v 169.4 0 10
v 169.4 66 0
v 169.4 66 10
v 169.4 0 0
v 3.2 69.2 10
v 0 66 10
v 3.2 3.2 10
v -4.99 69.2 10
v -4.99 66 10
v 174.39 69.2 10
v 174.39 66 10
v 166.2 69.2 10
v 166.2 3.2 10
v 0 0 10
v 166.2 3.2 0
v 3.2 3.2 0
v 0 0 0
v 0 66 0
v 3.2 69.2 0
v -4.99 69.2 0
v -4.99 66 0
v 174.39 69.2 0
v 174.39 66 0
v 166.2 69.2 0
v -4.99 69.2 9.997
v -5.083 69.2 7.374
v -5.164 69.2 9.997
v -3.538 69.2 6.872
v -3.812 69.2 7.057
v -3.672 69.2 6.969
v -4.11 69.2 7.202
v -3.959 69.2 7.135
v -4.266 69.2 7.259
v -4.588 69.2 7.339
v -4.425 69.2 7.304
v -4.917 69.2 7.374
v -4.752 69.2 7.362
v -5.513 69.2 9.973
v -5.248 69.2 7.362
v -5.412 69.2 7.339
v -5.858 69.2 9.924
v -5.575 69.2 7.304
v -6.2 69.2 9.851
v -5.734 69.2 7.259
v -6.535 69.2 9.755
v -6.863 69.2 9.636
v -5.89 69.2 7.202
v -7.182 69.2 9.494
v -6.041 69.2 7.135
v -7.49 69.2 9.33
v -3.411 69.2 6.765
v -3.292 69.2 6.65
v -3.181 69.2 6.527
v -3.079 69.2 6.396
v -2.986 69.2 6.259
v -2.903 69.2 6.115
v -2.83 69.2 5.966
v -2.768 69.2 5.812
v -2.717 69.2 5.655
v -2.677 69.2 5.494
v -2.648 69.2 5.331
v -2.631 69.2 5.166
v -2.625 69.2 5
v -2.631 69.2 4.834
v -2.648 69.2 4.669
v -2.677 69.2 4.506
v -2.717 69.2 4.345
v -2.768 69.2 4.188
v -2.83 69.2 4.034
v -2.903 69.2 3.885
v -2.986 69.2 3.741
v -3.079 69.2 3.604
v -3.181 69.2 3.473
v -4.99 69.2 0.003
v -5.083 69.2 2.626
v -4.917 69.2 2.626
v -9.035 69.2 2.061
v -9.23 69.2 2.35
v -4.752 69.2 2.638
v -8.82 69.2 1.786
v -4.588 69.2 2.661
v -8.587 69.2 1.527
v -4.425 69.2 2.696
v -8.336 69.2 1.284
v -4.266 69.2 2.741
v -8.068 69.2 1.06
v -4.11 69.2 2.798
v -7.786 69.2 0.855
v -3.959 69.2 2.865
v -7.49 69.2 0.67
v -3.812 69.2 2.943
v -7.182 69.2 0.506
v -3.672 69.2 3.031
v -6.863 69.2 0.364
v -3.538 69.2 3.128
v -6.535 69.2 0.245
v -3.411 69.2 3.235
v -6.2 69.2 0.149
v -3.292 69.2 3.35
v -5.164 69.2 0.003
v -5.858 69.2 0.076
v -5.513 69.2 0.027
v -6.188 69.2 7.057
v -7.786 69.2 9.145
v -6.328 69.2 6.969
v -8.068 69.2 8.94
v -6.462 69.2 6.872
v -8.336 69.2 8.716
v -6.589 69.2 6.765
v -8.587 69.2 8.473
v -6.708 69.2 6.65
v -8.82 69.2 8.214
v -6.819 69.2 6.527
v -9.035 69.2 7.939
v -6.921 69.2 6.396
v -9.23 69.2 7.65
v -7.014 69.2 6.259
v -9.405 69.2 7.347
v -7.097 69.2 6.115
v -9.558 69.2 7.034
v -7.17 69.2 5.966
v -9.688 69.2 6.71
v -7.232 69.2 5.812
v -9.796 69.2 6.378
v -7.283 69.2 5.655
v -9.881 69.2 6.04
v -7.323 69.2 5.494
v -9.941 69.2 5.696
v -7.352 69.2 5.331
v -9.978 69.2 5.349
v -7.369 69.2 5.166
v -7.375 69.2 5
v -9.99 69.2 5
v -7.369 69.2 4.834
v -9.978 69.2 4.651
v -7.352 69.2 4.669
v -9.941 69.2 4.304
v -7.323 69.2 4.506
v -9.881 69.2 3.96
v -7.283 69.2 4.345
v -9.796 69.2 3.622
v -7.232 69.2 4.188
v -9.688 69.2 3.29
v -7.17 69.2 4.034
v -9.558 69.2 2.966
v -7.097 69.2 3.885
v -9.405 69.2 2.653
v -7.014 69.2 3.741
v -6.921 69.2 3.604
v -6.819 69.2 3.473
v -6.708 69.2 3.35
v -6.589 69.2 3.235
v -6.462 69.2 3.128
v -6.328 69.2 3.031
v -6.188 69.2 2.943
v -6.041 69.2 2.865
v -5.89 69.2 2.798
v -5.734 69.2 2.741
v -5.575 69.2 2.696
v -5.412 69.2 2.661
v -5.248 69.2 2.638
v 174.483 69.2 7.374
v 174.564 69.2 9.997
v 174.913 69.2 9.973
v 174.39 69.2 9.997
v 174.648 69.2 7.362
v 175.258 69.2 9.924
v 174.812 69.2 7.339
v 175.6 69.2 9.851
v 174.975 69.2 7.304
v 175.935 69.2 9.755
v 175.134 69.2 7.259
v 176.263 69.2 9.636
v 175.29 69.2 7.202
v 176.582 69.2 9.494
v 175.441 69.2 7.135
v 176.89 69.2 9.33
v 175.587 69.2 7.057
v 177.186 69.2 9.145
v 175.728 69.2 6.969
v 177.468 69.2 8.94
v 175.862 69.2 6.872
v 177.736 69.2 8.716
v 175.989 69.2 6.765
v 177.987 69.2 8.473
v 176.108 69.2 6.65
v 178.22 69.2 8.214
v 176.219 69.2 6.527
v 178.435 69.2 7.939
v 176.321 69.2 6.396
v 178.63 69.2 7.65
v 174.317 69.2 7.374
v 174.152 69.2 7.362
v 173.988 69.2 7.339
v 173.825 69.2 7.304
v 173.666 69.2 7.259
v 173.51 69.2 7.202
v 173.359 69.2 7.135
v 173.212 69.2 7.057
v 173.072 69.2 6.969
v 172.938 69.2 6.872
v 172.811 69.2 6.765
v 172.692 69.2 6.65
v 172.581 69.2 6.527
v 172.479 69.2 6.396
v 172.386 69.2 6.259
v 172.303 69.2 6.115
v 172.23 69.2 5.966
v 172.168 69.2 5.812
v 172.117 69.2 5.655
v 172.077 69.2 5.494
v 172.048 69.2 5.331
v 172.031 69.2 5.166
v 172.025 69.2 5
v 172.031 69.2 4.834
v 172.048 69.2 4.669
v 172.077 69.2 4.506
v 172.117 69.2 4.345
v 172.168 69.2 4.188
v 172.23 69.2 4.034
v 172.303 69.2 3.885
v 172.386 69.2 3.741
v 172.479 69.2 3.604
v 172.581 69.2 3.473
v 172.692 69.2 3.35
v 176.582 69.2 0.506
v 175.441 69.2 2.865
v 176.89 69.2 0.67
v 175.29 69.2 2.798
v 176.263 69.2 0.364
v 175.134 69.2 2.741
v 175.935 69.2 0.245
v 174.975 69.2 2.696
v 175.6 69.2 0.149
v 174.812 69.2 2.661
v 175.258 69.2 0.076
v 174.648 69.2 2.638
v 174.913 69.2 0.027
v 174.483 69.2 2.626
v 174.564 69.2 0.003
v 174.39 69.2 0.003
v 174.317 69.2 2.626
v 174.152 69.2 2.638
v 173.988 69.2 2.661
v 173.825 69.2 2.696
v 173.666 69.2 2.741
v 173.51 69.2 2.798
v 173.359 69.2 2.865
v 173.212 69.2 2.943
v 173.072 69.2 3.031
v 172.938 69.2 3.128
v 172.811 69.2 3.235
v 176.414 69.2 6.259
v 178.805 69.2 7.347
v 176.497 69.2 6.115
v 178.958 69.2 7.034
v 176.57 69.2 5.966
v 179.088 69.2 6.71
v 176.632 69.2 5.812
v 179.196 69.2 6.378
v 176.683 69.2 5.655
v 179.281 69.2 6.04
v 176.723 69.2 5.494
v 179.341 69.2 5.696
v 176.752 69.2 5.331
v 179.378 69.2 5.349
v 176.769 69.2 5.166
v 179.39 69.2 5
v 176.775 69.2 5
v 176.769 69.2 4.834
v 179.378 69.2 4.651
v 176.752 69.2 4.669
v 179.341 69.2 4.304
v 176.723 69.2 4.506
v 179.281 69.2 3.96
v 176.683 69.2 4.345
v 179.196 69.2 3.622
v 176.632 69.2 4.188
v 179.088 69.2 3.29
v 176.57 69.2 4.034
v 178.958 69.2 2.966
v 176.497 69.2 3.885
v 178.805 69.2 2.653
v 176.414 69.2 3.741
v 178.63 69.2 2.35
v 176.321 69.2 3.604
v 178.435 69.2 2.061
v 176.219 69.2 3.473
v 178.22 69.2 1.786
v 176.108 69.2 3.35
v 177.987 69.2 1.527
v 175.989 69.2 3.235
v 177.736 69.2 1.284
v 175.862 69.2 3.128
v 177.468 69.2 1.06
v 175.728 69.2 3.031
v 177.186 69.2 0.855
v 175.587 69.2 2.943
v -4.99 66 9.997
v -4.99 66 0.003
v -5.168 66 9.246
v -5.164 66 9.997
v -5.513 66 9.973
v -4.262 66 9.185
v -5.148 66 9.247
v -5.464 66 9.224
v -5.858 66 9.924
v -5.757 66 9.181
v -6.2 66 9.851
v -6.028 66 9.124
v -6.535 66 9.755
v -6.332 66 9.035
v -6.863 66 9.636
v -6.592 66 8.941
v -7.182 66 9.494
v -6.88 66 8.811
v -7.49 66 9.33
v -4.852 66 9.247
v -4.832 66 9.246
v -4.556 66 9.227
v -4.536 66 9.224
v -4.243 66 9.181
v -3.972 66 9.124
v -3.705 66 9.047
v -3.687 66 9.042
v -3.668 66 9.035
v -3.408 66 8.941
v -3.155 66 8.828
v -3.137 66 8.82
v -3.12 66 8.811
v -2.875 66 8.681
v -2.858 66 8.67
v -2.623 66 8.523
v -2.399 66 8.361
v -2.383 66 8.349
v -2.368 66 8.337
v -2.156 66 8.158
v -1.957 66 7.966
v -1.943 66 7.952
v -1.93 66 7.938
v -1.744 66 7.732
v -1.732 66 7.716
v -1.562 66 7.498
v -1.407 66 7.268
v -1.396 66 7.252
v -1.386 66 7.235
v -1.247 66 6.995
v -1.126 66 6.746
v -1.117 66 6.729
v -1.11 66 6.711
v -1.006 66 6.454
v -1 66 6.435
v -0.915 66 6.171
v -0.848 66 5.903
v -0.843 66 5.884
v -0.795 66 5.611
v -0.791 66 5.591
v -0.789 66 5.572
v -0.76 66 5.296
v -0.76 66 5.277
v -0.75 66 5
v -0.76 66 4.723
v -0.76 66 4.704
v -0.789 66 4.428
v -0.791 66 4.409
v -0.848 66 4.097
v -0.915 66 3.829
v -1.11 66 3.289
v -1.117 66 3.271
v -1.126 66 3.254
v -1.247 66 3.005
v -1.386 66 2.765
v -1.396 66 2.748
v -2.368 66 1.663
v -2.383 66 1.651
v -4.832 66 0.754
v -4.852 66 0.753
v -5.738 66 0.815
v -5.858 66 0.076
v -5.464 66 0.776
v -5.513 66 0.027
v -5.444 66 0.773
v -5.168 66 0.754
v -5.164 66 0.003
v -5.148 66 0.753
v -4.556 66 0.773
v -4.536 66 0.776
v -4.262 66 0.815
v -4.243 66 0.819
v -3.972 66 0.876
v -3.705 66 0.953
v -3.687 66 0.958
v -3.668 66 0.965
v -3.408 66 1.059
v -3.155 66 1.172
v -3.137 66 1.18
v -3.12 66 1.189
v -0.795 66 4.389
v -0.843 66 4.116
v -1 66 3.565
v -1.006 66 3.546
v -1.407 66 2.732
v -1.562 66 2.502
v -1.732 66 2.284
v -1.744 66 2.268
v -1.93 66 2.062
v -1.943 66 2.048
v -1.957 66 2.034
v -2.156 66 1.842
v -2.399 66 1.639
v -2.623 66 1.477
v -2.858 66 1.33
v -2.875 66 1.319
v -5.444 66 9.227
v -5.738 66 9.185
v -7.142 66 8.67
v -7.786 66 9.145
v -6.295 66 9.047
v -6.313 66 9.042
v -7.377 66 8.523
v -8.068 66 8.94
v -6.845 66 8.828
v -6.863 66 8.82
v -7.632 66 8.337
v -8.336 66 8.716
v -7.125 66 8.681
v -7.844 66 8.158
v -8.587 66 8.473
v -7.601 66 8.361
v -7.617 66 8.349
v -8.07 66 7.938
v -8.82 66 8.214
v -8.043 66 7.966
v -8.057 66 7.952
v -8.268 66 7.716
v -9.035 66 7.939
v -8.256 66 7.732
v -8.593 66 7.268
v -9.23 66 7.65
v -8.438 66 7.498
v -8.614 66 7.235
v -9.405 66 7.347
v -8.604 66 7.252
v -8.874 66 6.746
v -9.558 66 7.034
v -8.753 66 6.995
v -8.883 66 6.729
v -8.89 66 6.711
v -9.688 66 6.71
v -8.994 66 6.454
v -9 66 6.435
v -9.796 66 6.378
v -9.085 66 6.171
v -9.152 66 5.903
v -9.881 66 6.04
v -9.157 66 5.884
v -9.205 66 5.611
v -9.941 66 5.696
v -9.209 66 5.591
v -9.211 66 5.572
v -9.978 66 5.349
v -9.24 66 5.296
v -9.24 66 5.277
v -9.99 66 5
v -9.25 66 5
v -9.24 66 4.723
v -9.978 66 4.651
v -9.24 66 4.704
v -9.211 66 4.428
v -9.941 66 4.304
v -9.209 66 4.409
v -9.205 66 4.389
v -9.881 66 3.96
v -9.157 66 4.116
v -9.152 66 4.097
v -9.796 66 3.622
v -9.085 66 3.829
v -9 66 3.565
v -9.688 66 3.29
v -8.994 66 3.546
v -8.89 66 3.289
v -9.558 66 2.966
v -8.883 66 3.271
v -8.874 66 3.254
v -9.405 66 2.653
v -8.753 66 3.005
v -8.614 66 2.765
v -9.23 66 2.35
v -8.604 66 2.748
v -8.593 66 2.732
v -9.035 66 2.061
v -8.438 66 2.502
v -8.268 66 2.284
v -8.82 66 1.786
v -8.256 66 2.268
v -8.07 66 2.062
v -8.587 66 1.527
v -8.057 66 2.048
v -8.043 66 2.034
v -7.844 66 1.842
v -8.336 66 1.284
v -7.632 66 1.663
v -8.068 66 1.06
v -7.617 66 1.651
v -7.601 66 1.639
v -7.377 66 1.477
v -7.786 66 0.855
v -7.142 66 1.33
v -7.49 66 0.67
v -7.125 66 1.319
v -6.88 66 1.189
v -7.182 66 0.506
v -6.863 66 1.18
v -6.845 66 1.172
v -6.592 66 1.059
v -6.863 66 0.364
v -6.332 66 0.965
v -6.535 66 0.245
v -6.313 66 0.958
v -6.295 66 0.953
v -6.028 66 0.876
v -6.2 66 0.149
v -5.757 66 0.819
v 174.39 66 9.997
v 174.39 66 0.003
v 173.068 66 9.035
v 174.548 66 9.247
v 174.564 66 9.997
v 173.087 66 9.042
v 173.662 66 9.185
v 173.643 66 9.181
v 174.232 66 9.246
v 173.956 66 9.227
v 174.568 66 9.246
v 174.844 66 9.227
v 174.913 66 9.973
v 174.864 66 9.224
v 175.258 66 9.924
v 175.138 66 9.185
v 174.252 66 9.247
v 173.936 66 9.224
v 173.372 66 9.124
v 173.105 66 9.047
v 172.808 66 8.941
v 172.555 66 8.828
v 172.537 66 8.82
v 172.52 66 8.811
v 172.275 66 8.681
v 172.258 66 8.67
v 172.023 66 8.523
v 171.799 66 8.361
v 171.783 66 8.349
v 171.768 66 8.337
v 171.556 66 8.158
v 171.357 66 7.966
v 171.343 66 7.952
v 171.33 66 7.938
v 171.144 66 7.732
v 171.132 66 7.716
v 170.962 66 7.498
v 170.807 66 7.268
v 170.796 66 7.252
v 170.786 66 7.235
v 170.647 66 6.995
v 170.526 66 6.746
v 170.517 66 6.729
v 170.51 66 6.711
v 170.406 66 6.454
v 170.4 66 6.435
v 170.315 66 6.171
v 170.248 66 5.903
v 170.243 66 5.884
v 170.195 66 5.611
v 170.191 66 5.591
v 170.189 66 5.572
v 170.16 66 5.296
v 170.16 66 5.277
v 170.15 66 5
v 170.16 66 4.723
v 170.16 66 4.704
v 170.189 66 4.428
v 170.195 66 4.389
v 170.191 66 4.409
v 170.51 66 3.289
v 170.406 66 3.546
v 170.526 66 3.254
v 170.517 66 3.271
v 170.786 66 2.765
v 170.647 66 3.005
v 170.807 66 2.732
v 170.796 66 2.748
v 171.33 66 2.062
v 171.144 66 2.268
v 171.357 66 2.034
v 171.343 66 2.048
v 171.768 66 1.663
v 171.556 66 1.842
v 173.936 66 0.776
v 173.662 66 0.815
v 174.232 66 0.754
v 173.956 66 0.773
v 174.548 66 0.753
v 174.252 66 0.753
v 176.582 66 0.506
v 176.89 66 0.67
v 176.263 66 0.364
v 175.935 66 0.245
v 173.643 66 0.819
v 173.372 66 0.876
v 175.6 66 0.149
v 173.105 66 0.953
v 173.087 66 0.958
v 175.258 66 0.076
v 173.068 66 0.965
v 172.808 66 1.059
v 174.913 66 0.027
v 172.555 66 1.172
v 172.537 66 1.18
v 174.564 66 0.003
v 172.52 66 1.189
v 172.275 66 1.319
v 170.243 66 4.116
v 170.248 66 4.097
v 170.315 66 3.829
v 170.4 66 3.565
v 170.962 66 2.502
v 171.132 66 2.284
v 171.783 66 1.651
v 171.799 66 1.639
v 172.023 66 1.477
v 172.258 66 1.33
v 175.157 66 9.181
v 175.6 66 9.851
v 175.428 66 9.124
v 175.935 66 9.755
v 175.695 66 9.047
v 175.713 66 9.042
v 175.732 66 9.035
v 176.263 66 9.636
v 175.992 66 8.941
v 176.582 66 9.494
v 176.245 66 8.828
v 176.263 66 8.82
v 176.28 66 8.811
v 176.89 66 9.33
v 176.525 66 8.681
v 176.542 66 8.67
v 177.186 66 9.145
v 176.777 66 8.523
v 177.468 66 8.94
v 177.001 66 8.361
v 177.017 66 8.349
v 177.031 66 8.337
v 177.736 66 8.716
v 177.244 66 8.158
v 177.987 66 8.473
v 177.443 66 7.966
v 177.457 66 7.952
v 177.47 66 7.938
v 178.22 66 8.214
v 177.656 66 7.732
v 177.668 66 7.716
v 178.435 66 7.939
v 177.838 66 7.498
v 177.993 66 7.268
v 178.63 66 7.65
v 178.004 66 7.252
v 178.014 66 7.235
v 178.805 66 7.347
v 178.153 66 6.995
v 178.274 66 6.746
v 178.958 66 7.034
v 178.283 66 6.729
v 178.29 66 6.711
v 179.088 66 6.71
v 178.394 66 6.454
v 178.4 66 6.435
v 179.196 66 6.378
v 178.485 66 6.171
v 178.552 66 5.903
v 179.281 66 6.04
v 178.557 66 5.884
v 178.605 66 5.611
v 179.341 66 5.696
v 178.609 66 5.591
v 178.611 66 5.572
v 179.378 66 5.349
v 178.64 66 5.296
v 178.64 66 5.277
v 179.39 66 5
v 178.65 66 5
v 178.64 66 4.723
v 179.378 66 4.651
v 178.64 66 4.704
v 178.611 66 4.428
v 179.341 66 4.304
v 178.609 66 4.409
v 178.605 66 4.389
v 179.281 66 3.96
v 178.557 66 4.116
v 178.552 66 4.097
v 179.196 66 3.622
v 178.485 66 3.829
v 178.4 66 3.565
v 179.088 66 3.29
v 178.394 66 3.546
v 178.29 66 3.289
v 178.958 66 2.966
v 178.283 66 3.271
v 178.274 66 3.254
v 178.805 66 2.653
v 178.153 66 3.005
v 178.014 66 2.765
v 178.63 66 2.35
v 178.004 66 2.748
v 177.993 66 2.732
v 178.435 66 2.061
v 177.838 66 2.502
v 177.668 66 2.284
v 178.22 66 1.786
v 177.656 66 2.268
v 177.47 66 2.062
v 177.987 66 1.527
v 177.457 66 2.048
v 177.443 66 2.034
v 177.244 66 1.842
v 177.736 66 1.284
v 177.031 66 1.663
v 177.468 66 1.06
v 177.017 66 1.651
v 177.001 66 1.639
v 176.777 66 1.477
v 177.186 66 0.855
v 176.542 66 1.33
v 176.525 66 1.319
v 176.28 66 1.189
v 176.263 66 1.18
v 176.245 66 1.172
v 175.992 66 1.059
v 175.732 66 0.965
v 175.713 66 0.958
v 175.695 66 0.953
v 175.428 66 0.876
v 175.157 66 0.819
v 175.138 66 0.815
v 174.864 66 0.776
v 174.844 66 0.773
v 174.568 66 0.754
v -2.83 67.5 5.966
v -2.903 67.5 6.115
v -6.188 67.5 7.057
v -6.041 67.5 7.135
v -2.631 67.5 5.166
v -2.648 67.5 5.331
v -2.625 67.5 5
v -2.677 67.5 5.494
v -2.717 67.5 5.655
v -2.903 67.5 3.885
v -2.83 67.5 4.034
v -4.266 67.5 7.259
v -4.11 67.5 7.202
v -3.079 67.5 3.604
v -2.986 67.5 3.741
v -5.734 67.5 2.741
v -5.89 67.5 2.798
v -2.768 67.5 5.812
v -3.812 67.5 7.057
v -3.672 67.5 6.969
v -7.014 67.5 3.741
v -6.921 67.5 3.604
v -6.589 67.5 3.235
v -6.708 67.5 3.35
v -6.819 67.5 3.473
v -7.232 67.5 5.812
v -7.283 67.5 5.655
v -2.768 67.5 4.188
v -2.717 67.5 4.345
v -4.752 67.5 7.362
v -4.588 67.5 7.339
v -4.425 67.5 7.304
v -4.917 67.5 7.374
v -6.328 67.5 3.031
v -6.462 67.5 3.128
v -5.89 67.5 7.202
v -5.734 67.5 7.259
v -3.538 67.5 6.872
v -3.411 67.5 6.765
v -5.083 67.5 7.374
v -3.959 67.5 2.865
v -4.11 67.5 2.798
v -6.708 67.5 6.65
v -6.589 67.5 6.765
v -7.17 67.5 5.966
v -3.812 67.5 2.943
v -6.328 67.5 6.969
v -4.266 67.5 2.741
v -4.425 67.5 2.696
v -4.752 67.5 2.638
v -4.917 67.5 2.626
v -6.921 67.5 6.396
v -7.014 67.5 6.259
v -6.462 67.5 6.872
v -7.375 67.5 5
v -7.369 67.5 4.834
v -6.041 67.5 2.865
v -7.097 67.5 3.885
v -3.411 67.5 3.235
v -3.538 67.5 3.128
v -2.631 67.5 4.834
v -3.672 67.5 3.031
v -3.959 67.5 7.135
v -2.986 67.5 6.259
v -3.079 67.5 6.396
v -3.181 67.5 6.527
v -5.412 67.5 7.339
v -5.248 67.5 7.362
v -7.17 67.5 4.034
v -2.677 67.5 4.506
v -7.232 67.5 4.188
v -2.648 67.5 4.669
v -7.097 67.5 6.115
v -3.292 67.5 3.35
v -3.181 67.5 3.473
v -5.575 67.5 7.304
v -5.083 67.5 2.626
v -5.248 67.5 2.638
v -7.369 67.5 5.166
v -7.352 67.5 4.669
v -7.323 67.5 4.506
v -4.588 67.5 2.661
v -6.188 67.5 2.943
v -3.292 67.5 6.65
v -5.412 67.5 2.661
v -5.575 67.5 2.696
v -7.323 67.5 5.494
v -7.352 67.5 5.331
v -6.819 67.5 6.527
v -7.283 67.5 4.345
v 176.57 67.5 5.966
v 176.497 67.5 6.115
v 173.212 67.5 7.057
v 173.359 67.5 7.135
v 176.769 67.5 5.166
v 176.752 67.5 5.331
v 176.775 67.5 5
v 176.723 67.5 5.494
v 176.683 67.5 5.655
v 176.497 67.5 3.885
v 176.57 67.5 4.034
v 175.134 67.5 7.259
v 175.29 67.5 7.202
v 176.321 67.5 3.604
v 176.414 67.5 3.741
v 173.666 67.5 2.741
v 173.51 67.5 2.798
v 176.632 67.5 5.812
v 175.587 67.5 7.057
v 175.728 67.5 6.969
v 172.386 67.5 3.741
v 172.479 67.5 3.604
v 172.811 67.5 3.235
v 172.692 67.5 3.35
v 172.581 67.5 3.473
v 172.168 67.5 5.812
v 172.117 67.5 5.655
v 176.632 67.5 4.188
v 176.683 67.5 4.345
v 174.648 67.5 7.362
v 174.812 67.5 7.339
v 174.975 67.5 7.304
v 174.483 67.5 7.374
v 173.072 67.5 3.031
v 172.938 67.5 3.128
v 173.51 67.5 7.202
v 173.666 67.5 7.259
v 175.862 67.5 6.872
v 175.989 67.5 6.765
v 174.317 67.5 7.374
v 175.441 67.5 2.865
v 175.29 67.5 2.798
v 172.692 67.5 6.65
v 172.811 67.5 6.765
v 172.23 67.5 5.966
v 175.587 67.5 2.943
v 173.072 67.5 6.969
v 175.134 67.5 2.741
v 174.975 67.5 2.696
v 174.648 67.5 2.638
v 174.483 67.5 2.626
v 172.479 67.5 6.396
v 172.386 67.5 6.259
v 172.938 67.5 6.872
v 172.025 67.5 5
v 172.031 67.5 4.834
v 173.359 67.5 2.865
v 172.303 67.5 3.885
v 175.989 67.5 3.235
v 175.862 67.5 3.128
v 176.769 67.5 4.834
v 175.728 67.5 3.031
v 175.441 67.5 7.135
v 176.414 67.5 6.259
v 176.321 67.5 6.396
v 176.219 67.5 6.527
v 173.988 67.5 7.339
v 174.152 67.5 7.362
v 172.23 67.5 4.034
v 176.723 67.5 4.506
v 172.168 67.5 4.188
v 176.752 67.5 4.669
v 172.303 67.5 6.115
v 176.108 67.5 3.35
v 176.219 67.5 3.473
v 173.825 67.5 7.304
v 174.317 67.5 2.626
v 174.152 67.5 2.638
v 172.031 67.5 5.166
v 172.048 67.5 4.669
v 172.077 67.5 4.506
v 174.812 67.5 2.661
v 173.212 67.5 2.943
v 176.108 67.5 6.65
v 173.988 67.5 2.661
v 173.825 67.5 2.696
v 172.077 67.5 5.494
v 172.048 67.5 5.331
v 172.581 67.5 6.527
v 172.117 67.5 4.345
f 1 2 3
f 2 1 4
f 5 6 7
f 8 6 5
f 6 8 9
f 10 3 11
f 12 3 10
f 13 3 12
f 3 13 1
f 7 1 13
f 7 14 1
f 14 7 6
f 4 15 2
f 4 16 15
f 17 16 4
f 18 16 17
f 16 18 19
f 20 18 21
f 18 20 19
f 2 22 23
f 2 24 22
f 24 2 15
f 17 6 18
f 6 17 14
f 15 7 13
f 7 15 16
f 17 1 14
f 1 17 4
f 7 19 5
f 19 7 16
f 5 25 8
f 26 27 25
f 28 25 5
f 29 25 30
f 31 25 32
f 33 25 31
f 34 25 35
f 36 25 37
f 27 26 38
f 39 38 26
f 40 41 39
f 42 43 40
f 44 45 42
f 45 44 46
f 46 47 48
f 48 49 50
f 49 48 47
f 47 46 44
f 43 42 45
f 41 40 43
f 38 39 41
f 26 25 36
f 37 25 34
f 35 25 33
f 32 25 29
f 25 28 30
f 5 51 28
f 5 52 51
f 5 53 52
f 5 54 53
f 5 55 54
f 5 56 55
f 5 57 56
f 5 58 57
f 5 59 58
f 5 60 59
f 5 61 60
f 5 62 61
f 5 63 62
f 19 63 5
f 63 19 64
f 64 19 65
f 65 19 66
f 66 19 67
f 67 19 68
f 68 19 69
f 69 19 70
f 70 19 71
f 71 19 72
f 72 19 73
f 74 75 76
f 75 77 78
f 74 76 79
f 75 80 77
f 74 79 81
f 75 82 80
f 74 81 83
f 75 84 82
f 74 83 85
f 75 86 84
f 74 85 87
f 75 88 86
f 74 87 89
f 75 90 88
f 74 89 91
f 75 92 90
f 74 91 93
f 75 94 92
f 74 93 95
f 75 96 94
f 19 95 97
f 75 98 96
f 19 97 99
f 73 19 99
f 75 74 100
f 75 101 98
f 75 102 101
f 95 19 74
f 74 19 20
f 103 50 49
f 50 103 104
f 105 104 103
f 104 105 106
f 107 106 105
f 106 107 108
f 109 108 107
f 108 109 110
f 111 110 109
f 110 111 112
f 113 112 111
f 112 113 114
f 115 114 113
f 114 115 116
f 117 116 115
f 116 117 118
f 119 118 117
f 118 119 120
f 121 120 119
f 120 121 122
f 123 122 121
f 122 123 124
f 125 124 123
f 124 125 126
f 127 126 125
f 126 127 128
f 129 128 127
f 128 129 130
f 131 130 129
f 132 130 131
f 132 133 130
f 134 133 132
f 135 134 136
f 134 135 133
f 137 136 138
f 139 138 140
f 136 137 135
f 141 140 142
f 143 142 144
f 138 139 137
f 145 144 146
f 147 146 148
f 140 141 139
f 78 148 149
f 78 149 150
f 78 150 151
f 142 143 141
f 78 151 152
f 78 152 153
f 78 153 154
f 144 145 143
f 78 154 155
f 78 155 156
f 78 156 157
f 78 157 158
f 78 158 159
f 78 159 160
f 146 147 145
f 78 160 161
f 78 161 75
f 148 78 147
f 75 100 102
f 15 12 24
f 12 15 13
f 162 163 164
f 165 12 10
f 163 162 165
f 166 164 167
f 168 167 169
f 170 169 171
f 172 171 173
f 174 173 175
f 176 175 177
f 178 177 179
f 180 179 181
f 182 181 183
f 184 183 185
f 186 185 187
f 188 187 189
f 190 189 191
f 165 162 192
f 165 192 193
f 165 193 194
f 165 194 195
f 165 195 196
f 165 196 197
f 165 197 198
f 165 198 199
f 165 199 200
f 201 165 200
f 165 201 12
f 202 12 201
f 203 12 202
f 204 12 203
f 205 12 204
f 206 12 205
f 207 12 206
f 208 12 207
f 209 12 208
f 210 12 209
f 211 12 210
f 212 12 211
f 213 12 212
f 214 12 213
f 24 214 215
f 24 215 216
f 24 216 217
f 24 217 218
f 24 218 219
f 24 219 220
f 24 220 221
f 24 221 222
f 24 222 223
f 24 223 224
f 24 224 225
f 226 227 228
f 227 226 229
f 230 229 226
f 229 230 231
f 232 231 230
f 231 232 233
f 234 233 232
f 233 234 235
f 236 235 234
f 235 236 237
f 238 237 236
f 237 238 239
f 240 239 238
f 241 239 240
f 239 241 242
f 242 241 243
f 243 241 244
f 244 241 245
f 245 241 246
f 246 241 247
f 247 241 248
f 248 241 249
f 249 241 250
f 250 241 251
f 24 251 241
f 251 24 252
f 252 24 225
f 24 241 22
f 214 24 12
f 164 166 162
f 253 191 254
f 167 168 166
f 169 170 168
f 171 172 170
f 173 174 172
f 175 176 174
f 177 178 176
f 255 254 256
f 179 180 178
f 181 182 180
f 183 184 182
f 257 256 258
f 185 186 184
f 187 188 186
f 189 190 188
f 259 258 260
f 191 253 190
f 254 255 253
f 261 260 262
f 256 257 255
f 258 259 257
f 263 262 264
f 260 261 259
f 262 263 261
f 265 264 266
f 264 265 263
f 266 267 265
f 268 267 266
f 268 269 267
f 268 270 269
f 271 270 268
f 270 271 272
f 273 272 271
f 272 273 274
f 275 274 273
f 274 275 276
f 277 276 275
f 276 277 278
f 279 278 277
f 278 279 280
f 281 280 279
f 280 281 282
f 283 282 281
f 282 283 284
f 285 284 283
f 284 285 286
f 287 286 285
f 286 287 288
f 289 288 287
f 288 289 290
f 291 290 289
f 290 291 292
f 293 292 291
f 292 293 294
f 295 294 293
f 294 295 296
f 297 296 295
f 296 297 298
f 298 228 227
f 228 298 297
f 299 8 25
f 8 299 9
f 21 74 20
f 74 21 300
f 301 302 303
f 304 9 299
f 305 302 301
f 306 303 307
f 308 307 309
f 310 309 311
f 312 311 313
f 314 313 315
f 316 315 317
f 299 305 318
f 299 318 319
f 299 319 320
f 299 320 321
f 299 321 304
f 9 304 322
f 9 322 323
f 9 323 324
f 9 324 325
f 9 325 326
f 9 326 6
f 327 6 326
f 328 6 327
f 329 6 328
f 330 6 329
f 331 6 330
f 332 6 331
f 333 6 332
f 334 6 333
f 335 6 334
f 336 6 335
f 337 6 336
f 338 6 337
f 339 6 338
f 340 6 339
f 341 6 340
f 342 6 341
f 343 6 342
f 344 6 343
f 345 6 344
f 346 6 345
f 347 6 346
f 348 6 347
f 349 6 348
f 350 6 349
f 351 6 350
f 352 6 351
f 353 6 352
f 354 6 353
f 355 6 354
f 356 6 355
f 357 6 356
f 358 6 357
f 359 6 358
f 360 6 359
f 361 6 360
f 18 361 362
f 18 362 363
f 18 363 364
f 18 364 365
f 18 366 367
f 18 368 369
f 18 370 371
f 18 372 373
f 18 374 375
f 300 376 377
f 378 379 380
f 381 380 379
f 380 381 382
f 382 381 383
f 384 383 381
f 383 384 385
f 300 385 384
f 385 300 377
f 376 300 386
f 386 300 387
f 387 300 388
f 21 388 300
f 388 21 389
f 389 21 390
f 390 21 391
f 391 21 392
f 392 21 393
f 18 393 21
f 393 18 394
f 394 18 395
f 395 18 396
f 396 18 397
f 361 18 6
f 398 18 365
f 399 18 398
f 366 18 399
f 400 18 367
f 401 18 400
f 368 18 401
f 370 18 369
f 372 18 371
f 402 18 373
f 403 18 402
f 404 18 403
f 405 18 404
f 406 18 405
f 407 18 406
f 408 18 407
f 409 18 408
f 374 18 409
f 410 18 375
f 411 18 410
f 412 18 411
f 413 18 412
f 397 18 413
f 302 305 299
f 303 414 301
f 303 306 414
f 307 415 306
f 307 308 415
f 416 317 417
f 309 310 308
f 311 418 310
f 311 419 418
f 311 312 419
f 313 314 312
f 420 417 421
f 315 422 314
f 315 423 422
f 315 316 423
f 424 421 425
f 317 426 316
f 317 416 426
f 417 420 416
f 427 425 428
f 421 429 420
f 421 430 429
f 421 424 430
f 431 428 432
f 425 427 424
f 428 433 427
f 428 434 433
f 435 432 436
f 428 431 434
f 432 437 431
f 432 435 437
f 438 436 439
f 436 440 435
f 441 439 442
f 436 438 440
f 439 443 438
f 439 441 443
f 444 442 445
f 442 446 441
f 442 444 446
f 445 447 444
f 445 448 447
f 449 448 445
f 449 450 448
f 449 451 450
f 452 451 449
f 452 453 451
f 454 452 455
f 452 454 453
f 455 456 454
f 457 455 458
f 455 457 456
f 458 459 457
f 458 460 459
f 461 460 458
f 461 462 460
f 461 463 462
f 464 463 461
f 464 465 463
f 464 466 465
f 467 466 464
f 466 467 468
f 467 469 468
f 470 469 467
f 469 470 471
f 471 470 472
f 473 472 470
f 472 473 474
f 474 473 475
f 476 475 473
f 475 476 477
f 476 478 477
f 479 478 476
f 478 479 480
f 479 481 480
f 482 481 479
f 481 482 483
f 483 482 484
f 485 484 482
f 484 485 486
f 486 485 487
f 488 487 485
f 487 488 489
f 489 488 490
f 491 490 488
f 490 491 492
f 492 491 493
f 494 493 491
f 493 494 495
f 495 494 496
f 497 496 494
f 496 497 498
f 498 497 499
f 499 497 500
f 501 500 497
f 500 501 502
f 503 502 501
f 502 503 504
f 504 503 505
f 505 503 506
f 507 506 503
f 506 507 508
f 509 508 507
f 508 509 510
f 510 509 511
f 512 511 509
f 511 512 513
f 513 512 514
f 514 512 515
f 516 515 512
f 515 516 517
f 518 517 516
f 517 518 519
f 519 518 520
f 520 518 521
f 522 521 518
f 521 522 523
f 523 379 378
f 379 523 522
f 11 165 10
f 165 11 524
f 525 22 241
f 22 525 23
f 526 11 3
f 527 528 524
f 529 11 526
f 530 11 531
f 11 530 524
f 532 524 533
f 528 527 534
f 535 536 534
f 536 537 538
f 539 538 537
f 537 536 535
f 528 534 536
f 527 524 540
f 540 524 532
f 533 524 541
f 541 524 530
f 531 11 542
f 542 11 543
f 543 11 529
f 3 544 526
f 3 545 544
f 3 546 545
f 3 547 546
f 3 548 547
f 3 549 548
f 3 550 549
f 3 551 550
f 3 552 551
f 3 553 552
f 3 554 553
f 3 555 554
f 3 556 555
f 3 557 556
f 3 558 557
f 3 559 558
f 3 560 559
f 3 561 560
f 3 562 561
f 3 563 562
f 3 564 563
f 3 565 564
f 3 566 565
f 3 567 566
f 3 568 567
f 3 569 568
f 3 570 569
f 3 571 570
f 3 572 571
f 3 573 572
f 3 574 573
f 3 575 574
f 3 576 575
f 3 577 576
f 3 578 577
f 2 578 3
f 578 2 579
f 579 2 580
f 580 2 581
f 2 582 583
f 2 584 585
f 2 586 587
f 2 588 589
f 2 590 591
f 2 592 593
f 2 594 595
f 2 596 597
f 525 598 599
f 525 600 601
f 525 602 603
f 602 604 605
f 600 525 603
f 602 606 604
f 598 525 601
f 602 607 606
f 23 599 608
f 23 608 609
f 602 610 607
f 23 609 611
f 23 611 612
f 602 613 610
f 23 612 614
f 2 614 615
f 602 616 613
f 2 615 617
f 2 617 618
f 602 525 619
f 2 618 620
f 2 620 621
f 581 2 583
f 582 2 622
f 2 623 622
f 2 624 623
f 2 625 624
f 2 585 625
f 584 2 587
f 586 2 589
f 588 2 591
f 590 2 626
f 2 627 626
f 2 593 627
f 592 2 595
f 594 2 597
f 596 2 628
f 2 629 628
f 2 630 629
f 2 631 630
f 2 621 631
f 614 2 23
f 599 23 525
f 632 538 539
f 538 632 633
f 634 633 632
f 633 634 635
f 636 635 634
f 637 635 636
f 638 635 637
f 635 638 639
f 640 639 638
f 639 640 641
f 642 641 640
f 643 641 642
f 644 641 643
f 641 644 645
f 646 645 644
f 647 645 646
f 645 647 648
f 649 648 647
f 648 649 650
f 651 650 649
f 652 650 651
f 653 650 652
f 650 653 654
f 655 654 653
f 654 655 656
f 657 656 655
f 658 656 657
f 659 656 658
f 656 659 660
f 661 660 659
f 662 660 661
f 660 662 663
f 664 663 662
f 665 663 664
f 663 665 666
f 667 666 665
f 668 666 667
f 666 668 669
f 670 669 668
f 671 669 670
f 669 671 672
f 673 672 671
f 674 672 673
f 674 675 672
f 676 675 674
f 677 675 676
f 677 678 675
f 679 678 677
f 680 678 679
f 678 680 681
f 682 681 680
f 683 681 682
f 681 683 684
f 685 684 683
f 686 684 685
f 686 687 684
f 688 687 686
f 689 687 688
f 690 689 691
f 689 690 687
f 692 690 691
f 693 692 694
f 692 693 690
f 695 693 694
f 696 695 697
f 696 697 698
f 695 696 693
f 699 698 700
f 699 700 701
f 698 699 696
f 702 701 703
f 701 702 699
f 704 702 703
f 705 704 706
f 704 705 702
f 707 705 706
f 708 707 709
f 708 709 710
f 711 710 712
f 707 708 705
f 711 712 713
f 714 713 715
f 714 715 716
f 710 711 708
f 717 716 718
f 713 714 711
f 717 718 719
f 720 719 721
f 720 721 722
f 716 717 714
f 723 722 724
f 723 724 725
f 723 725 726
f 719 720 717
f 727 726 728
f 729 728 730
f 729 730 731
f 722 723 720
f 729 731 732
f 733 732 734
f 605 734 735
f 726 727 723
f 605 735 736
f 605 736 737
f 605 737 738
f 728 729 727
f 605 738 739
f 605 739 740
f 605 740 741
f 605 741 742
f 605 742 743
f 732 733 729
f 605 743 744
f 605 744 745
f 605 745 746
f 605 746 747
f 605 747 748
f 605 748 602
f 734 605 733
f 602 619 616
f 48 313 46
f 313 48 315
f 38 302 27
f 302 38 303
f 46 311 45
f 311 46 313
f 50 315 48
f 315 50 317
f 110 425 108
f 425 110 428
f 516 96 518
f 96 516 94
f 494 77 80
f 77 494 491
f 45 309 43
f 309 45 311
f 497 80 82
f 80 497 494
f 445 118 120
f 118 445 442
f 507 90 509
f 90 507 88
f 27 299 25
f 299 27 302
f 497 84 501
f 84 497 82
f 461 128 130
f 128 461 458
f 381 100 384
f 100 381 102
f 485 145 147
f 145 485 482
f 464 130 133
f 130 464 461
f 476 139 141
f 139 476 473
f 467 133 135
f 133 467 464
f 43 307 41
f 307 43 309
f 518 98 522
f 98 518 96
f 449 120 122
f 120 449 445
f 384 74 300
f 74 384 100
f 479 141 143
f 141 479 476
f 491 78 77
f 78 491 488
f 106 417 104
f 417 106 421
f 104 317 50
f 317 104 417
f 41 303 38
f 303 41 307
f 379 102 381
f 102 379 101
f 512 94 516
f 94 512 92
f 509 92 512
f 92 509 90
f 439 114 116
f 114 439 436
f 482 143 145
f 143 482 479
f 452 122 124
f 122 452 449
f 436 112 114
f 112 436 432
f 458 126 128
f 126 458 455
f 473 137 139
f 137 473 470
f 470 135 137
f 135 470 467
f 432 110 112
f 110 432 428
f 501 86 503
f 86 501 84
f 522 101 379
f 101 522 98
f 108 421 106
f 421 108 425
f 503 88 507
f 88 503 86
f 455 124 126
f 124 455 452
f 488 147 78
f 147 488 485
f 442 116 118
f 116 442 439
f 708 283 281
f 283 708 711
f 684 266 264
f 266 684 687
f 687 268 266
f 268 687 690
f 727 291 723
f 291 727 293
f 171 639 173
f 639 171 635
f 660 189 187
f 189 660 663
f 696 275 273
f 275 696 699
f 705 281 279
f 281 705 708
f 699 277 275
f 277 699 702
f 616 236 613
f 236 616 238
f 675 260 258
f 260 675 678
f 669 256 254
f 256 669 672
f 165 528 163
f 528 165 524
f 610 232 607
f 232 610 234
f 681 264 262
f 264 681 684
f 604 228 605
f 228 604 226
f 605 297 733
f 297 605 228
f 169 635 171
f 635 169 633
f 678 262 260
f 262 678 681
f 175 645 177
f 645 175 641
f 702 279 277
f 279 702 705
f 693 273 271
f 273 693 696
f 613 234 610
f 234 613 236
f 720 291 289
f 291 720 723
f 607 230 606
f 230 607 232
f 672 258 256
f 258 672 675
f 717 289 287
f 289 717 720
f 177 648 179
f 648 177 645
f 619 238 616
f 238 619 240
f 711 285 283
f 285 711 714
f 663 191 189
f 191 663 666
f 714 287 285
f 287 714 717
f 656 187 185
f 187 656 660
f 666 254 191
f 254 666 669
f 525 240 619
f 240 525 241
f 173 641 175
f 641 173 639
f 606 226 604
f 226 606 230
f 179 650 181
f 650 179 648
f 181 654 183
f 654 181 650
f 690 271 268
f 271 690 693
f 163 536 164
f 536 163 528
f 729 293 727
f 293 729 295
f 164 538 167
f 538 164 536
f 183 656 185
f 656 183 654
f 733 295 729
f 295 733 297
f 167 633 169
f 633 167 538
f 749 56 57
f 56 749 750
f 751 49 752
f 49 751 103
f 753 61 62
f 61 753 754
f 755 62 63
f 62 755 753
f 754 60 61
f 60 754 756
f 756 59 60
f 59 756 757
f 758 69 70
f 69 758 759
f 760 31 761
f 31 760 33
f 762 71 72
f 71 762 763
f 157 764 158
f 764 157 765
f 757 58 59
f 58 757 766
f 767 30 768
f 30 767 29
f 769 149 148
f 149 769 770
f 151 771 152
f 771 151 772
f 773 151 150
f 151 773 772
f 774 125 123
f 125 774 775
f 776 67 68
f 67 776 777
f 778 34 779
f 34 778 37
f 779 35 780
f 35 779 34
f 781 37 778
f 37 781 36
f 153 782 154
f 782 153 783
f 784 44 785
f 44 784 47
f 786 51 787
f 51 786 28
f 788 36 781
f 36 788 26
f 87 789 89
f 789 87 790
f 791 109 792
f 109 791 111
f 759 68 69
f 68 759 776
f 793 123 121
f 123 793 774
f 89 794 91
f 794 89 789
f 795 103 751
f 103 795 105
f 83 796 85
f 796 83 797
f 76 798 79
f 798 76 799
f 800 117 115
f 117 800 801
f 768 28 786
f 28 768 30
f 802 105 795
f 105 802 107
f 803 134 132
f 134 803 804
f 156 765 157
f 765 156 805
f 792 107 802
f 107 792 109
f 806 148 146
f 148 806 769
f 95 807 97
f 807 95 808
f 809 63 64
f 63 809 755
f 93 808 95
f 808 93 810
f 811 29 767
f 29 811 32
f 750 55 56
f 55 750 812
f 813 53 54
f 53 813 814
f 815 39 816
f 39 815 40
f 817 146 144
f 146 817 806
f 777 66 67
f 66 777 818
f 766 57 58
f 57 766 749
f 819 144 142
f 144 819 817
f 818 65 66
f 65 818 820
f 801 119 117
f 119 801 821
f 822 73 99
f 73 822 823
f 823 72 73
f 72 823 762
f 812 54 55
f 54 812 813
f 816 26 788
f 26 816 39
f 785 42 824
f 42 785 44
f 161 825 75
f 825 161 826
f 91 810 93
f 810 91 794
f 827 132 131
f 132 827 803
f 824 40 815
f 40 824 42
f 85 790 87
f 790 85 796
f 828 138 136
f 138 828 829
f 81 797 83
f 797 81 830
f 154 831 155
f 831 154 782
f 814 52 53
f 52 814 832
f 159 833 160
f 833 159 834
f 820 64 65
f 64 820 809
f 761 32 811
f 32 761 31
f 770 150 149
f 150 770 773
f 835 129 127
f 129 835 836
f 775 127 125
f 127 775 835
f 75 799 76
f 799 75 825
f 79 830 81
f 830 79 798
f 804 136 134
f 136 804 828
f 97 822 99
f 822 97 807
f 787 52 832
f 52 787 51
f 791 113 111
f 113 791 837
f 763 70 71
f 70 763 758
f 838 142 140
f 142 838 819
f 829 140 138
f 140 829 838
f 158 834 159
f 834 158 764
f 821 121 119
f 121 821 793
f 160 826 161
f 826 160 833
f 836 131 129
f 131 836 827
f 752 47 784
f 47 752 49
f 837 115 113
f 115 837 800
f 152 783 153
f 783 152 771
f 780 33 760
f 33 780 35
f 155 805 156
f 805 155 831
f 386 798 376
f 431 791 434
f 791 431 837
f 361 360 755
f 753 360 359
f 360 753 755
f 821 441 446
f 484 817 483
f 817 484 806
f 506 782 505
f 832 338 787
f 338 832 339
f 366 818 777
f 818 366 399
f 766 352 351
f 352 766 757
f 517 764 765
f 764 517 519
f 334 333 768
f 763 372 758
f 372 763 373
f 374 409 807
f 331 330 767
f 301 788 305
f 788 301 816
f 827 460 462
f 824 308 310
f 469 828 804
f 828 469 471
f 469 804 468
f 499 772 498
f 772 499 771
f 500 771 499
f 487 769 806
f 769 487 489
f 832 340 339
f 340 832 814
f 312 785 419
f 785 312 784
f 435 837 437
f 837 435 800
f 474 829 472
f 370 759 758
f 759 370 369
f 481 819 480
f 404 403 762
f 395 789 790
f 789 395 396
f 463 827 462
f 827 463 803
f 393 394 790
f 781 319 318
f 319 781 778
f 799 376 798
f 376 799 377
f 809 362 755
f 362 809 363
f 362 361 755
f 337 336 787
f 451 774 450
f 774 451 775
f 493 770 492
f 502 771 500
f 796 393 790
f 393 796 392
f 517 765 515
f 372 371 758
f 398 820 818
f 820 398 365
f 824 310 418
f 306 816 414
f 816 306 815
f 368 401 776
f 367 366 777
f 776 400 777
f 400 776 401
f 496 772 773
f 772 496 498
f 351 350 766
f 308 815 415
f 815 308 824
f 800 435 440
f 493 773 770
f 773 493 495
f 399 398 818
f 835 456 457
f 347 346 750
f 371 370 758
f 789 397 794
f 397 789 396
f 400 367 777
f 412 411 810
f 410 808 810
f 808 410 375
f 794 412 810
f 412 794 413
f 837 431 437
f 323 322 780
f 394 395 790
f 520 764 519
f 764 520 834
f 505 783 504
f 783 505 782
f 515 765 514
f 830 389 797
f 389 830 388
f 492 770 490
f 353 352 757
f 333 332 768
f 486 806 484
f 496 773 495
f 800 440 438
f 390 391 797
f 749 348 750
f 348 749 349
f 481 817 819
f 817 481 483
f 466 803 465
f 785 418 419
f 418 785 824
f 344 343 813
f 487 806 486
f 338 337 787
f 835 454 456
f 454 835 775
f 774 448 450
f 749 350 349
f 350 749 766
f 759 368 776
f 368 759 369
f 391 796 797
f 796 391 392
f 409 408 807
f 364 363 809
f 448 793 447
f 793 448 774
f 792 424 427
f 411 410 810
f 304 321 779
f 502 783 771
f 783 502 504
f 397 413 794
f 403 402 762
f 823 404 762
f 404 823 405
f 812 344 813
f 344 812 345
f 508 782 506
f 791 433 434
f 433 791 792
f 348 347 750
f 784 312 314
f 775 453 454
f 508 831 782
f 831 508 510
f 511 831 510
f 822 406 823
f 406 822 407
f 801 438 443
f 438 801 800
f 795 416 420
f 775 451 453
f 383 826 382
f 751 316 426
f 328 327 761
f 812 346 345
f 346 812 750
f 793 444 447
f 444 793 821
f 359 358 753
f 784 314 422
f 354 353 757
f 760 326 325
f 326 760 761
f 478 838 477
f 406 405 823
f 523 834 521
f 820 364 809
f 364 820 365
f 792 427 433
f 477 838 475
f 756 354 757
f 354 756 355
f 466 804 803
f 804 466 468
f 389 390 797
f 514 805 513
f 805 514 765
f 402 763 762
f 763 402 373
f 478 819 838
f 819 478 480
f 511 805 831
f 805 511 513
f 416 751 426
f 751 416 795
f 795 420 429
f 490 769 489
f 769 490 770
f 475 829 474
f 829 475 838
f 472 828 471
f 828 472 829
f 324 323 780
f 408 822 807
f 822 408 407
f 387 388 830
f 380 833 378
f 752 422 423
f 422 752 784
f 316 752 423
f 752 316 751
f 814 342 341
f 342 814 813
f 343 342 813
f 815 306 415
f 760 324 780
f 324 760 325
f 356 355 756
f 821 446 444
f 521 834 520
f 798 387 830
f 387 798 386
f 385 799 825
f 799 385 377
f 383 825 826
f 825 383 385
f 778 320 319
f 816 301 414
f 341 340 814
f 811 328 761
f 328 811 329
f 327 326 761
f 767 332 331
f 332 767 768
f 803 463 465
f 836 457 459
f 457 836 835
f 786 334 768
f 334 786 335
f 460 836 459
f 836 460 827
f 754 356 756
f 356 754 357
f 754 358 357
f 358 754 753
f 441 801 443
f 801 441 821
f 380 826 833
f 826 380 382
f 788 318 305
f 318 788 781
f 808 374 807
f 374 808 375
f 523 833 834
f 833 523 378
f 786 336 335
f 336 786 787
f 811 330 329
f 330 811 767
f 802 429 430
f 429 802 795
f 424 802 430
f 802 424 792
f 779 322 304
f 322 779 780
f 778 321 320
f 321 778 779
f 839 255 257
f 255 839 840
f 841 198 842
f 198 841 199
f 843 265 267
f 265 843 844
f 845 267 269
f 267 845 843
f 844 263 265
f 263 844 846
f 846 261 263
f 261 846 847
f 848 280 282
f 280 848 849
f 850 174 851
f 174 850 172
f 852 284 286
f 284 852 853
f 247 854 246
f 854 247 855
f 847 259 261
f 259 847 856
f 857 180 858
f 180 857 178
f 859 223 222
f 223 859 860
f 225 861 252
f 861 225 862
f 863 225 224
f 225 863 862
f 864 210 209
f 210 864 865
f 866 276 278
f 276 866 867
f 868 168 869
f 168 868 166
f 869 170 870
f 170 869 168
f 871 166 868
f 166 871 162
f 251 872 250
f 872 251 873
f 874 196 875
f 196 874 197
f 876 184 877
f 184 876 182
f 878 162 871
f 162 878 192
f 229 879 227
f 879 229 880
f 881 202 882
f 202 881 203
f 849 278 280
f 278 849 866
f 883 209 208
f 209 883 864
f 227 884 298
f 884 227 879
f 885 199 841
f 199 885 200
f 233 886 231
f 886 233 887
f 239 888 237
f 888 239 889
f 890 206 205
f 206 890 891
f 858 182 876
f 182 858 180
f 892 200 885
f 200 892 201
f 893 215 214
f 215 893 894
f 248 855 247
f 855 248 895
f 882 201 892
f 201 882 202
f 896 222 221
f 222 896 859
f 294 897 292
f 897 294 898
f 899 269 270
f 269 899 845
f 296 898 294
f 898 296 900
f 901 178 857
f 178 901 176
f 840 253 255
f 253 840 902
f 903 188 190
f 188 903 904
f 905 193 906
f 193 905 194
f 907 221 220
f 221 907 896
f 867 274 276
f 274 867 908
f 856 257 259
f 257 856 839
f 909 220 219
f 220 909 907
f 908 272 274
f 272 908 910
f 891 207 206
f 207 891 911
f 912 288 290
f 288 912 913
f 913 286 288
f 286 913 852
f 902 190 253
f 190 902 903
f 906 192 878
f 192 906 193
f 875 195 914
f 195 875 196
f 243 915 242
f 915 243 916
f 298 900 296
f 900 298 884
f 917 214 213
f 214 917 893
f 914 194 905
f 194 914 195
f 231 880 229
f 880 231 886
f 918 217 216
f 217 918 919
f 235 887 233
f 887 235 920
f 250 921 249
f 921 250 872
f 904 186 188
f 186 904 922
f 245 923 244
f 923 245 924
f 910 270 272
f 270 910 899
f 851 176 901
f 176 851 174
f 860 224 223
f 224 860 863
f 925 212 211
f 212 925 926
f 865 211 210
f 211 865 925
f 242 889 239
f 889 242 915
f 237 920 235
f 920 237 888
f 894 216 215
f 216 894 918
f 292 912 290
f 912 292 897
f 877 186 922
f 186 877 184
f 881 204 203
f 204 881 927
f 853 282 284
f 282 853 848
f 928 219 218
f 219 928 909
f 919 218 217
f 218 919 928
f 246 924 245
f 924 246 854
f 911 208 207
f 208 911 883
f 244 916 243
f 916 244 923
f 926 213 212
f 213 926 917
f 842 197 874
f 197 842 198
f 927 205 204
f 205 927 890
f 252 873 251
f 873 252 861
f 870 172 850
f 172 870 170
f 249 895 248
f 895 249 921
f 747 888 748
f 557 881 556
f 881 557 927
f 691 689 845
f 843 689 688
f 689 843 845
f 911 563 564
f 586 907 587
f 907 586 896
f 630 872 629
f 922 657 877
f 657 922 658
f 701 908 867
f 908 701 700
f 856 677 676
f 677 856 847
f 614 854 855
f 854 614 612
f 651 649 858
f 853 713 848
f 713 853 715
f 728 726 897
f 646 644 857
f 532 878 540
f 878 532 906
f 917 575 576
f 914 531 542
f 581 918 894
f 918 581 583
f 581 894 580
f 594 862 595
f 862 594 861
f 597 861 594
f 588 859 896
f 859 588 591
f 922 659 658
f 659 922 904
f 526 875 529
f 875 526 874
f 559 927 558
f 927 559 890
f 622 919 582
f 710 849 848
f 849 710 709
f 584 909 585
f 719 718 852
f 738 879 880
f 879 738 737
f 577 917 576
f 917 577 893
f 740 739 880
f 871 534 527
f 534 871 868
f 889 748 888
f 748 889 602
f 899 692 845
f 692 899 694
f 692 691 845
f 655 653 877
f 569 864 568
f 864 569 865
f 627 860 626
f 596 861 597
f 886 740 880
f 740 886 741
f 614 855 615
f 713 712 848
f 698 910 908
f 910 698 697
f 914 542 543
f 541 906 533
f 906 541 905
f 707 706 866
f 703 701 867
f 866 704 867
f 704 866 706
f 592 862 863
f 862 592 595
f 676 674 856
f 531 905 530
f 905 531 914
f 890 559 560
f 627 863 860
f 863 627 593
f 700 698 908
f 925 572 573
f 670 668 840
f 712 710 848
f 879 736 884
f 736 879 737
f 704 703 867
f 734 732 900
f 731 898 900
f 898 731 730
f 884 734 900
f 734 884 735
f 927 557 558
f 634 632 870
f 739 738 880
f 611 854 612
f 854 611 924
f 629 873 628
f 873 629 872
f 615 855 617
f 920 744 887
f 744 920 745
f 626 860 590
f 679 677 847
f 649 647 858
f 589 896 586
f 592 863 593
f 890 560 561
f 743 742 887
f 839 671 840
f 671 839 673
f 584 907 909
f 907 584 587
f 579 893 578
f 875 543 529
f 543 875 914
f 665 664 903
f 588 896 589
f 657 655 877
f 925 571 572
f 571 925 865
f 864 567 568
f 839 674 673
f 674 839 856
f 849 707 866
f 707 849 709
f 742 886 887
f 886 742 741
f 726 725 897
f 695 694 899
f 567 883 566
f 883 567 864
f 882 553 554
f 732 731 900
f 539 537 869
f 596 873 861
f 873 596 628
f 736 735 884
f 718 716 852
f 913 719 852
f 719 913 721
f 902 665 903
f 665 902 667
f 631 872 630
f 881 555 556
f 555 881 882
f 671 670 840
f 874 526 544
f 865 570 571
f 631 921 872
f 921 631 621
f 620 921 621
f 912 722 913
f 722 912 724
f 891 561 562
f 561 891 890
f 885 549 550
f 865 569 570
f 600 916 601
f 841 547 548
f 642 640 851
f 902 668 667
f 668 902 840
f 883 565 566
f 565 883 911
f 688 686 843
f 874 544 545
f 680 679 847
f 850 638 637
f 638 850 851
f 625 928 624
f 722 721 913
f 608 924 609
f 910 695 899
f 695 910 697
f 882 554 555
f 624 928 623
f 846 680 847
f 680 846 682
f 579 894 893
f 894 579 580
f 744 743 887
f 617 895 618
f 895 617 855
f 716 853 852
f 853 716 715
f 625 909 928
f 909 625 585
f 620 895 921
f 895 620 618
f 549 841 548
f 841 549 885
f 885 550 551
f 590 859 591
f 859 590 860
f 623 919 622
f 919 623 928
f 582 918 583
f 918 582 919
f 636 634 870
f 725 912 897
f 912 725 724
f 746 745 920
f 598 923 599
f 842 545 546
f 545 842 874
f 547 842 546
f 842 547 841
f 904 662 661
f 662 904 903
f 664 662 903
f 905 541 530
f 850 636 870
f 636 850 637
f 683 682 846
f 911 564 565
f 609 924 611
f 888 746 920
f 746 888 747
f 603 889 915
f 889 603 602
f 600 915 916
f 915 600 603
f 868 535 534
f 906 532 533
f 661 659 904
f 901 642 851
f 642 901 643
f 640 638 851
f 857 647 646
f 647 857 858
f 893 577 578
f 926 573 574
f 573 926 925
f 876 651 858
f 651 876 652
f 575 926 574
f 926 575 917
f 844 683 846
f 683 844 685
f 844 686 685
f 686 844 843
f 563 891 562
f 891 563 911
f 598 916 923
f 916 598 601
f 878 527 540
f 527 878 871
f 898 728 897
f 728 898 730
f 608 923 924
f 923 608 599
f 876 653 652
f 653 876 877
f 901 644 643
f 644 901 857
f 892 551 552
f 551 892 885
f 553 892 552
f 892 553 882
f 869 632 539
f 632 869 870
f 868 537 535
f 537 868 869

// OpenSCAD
$fa=4; // default minimum facet angle is now 0.5
$fs=0.05; // default minimum facet size is now 0.05 mm

width = 163;
depth = 66;

wallThickness = 3.2;
strapThickness = 10;

screwHoleDiam = 4.75;
countersinkDiam = 9;

tabLen = 5;


difference() {
  union() {
    cube([width + wallThickness * 2, wallThickness, strapThickness]);
    cube([wallThickness, depth + wallThickness, strapThickness]);
    translate([wallThickness + width, 0, 0]) cube([wallThickness, depth + wallThickness, strapThickness]);
    translate([-tabLen + .01, depth, 0]) cube([tabLen, wallThickness, strapThickness]);
    translate([width + wallThickness * 2 - .01, depth, 0]) cube([tabLen, wallThickness, strapThickness]);
    translate([-tabLen + .01, depth + wallThickness, strapThickness / 2]) rotate([90, 0, 0]) cylinder(r = strapThickness / 2, h = wallThickness);
    translate([width + wallThickness * 2 - .01 + tabLen, depth + wallThickness, strapThickness / 2]) rotate([90, 0, 0]) cylinder(r = strapThickness / 2, h = wallThickness);
  }

  #translate([-tabLen, depth + wallThickness * 2, strapThickness / 2]) rotate([90, 0, 0]) chamferedScrewHole(countersinkDiam / 2, screwHoleDiam / 2, wallThickness * 2, wallThickness / 2);
  #translate([width + 2 * wallThickness + tabLen, depth + wallThickness * 2, strapThickness / 2]) rotate([90, 0, 0]) chamferedScrewHole(countersinkDiam / 2, screwHoleDiam / 2, wallThickness * 2, wallThickness / 2);
}

module chamferedScrewHole(rh, rs, d, ds, t = .1) {
  translate([0, 0, -t]) cylinder(r=rs, h=d + t);
  translate([0, 0, d - ds + t]) cylinder(r1=rs, r2=rh, h=ds + t);
  translate([0, 0, d - ds + 2*t + ds - .01]) cylinder(r=rh, h=ds + t + 5);
}
